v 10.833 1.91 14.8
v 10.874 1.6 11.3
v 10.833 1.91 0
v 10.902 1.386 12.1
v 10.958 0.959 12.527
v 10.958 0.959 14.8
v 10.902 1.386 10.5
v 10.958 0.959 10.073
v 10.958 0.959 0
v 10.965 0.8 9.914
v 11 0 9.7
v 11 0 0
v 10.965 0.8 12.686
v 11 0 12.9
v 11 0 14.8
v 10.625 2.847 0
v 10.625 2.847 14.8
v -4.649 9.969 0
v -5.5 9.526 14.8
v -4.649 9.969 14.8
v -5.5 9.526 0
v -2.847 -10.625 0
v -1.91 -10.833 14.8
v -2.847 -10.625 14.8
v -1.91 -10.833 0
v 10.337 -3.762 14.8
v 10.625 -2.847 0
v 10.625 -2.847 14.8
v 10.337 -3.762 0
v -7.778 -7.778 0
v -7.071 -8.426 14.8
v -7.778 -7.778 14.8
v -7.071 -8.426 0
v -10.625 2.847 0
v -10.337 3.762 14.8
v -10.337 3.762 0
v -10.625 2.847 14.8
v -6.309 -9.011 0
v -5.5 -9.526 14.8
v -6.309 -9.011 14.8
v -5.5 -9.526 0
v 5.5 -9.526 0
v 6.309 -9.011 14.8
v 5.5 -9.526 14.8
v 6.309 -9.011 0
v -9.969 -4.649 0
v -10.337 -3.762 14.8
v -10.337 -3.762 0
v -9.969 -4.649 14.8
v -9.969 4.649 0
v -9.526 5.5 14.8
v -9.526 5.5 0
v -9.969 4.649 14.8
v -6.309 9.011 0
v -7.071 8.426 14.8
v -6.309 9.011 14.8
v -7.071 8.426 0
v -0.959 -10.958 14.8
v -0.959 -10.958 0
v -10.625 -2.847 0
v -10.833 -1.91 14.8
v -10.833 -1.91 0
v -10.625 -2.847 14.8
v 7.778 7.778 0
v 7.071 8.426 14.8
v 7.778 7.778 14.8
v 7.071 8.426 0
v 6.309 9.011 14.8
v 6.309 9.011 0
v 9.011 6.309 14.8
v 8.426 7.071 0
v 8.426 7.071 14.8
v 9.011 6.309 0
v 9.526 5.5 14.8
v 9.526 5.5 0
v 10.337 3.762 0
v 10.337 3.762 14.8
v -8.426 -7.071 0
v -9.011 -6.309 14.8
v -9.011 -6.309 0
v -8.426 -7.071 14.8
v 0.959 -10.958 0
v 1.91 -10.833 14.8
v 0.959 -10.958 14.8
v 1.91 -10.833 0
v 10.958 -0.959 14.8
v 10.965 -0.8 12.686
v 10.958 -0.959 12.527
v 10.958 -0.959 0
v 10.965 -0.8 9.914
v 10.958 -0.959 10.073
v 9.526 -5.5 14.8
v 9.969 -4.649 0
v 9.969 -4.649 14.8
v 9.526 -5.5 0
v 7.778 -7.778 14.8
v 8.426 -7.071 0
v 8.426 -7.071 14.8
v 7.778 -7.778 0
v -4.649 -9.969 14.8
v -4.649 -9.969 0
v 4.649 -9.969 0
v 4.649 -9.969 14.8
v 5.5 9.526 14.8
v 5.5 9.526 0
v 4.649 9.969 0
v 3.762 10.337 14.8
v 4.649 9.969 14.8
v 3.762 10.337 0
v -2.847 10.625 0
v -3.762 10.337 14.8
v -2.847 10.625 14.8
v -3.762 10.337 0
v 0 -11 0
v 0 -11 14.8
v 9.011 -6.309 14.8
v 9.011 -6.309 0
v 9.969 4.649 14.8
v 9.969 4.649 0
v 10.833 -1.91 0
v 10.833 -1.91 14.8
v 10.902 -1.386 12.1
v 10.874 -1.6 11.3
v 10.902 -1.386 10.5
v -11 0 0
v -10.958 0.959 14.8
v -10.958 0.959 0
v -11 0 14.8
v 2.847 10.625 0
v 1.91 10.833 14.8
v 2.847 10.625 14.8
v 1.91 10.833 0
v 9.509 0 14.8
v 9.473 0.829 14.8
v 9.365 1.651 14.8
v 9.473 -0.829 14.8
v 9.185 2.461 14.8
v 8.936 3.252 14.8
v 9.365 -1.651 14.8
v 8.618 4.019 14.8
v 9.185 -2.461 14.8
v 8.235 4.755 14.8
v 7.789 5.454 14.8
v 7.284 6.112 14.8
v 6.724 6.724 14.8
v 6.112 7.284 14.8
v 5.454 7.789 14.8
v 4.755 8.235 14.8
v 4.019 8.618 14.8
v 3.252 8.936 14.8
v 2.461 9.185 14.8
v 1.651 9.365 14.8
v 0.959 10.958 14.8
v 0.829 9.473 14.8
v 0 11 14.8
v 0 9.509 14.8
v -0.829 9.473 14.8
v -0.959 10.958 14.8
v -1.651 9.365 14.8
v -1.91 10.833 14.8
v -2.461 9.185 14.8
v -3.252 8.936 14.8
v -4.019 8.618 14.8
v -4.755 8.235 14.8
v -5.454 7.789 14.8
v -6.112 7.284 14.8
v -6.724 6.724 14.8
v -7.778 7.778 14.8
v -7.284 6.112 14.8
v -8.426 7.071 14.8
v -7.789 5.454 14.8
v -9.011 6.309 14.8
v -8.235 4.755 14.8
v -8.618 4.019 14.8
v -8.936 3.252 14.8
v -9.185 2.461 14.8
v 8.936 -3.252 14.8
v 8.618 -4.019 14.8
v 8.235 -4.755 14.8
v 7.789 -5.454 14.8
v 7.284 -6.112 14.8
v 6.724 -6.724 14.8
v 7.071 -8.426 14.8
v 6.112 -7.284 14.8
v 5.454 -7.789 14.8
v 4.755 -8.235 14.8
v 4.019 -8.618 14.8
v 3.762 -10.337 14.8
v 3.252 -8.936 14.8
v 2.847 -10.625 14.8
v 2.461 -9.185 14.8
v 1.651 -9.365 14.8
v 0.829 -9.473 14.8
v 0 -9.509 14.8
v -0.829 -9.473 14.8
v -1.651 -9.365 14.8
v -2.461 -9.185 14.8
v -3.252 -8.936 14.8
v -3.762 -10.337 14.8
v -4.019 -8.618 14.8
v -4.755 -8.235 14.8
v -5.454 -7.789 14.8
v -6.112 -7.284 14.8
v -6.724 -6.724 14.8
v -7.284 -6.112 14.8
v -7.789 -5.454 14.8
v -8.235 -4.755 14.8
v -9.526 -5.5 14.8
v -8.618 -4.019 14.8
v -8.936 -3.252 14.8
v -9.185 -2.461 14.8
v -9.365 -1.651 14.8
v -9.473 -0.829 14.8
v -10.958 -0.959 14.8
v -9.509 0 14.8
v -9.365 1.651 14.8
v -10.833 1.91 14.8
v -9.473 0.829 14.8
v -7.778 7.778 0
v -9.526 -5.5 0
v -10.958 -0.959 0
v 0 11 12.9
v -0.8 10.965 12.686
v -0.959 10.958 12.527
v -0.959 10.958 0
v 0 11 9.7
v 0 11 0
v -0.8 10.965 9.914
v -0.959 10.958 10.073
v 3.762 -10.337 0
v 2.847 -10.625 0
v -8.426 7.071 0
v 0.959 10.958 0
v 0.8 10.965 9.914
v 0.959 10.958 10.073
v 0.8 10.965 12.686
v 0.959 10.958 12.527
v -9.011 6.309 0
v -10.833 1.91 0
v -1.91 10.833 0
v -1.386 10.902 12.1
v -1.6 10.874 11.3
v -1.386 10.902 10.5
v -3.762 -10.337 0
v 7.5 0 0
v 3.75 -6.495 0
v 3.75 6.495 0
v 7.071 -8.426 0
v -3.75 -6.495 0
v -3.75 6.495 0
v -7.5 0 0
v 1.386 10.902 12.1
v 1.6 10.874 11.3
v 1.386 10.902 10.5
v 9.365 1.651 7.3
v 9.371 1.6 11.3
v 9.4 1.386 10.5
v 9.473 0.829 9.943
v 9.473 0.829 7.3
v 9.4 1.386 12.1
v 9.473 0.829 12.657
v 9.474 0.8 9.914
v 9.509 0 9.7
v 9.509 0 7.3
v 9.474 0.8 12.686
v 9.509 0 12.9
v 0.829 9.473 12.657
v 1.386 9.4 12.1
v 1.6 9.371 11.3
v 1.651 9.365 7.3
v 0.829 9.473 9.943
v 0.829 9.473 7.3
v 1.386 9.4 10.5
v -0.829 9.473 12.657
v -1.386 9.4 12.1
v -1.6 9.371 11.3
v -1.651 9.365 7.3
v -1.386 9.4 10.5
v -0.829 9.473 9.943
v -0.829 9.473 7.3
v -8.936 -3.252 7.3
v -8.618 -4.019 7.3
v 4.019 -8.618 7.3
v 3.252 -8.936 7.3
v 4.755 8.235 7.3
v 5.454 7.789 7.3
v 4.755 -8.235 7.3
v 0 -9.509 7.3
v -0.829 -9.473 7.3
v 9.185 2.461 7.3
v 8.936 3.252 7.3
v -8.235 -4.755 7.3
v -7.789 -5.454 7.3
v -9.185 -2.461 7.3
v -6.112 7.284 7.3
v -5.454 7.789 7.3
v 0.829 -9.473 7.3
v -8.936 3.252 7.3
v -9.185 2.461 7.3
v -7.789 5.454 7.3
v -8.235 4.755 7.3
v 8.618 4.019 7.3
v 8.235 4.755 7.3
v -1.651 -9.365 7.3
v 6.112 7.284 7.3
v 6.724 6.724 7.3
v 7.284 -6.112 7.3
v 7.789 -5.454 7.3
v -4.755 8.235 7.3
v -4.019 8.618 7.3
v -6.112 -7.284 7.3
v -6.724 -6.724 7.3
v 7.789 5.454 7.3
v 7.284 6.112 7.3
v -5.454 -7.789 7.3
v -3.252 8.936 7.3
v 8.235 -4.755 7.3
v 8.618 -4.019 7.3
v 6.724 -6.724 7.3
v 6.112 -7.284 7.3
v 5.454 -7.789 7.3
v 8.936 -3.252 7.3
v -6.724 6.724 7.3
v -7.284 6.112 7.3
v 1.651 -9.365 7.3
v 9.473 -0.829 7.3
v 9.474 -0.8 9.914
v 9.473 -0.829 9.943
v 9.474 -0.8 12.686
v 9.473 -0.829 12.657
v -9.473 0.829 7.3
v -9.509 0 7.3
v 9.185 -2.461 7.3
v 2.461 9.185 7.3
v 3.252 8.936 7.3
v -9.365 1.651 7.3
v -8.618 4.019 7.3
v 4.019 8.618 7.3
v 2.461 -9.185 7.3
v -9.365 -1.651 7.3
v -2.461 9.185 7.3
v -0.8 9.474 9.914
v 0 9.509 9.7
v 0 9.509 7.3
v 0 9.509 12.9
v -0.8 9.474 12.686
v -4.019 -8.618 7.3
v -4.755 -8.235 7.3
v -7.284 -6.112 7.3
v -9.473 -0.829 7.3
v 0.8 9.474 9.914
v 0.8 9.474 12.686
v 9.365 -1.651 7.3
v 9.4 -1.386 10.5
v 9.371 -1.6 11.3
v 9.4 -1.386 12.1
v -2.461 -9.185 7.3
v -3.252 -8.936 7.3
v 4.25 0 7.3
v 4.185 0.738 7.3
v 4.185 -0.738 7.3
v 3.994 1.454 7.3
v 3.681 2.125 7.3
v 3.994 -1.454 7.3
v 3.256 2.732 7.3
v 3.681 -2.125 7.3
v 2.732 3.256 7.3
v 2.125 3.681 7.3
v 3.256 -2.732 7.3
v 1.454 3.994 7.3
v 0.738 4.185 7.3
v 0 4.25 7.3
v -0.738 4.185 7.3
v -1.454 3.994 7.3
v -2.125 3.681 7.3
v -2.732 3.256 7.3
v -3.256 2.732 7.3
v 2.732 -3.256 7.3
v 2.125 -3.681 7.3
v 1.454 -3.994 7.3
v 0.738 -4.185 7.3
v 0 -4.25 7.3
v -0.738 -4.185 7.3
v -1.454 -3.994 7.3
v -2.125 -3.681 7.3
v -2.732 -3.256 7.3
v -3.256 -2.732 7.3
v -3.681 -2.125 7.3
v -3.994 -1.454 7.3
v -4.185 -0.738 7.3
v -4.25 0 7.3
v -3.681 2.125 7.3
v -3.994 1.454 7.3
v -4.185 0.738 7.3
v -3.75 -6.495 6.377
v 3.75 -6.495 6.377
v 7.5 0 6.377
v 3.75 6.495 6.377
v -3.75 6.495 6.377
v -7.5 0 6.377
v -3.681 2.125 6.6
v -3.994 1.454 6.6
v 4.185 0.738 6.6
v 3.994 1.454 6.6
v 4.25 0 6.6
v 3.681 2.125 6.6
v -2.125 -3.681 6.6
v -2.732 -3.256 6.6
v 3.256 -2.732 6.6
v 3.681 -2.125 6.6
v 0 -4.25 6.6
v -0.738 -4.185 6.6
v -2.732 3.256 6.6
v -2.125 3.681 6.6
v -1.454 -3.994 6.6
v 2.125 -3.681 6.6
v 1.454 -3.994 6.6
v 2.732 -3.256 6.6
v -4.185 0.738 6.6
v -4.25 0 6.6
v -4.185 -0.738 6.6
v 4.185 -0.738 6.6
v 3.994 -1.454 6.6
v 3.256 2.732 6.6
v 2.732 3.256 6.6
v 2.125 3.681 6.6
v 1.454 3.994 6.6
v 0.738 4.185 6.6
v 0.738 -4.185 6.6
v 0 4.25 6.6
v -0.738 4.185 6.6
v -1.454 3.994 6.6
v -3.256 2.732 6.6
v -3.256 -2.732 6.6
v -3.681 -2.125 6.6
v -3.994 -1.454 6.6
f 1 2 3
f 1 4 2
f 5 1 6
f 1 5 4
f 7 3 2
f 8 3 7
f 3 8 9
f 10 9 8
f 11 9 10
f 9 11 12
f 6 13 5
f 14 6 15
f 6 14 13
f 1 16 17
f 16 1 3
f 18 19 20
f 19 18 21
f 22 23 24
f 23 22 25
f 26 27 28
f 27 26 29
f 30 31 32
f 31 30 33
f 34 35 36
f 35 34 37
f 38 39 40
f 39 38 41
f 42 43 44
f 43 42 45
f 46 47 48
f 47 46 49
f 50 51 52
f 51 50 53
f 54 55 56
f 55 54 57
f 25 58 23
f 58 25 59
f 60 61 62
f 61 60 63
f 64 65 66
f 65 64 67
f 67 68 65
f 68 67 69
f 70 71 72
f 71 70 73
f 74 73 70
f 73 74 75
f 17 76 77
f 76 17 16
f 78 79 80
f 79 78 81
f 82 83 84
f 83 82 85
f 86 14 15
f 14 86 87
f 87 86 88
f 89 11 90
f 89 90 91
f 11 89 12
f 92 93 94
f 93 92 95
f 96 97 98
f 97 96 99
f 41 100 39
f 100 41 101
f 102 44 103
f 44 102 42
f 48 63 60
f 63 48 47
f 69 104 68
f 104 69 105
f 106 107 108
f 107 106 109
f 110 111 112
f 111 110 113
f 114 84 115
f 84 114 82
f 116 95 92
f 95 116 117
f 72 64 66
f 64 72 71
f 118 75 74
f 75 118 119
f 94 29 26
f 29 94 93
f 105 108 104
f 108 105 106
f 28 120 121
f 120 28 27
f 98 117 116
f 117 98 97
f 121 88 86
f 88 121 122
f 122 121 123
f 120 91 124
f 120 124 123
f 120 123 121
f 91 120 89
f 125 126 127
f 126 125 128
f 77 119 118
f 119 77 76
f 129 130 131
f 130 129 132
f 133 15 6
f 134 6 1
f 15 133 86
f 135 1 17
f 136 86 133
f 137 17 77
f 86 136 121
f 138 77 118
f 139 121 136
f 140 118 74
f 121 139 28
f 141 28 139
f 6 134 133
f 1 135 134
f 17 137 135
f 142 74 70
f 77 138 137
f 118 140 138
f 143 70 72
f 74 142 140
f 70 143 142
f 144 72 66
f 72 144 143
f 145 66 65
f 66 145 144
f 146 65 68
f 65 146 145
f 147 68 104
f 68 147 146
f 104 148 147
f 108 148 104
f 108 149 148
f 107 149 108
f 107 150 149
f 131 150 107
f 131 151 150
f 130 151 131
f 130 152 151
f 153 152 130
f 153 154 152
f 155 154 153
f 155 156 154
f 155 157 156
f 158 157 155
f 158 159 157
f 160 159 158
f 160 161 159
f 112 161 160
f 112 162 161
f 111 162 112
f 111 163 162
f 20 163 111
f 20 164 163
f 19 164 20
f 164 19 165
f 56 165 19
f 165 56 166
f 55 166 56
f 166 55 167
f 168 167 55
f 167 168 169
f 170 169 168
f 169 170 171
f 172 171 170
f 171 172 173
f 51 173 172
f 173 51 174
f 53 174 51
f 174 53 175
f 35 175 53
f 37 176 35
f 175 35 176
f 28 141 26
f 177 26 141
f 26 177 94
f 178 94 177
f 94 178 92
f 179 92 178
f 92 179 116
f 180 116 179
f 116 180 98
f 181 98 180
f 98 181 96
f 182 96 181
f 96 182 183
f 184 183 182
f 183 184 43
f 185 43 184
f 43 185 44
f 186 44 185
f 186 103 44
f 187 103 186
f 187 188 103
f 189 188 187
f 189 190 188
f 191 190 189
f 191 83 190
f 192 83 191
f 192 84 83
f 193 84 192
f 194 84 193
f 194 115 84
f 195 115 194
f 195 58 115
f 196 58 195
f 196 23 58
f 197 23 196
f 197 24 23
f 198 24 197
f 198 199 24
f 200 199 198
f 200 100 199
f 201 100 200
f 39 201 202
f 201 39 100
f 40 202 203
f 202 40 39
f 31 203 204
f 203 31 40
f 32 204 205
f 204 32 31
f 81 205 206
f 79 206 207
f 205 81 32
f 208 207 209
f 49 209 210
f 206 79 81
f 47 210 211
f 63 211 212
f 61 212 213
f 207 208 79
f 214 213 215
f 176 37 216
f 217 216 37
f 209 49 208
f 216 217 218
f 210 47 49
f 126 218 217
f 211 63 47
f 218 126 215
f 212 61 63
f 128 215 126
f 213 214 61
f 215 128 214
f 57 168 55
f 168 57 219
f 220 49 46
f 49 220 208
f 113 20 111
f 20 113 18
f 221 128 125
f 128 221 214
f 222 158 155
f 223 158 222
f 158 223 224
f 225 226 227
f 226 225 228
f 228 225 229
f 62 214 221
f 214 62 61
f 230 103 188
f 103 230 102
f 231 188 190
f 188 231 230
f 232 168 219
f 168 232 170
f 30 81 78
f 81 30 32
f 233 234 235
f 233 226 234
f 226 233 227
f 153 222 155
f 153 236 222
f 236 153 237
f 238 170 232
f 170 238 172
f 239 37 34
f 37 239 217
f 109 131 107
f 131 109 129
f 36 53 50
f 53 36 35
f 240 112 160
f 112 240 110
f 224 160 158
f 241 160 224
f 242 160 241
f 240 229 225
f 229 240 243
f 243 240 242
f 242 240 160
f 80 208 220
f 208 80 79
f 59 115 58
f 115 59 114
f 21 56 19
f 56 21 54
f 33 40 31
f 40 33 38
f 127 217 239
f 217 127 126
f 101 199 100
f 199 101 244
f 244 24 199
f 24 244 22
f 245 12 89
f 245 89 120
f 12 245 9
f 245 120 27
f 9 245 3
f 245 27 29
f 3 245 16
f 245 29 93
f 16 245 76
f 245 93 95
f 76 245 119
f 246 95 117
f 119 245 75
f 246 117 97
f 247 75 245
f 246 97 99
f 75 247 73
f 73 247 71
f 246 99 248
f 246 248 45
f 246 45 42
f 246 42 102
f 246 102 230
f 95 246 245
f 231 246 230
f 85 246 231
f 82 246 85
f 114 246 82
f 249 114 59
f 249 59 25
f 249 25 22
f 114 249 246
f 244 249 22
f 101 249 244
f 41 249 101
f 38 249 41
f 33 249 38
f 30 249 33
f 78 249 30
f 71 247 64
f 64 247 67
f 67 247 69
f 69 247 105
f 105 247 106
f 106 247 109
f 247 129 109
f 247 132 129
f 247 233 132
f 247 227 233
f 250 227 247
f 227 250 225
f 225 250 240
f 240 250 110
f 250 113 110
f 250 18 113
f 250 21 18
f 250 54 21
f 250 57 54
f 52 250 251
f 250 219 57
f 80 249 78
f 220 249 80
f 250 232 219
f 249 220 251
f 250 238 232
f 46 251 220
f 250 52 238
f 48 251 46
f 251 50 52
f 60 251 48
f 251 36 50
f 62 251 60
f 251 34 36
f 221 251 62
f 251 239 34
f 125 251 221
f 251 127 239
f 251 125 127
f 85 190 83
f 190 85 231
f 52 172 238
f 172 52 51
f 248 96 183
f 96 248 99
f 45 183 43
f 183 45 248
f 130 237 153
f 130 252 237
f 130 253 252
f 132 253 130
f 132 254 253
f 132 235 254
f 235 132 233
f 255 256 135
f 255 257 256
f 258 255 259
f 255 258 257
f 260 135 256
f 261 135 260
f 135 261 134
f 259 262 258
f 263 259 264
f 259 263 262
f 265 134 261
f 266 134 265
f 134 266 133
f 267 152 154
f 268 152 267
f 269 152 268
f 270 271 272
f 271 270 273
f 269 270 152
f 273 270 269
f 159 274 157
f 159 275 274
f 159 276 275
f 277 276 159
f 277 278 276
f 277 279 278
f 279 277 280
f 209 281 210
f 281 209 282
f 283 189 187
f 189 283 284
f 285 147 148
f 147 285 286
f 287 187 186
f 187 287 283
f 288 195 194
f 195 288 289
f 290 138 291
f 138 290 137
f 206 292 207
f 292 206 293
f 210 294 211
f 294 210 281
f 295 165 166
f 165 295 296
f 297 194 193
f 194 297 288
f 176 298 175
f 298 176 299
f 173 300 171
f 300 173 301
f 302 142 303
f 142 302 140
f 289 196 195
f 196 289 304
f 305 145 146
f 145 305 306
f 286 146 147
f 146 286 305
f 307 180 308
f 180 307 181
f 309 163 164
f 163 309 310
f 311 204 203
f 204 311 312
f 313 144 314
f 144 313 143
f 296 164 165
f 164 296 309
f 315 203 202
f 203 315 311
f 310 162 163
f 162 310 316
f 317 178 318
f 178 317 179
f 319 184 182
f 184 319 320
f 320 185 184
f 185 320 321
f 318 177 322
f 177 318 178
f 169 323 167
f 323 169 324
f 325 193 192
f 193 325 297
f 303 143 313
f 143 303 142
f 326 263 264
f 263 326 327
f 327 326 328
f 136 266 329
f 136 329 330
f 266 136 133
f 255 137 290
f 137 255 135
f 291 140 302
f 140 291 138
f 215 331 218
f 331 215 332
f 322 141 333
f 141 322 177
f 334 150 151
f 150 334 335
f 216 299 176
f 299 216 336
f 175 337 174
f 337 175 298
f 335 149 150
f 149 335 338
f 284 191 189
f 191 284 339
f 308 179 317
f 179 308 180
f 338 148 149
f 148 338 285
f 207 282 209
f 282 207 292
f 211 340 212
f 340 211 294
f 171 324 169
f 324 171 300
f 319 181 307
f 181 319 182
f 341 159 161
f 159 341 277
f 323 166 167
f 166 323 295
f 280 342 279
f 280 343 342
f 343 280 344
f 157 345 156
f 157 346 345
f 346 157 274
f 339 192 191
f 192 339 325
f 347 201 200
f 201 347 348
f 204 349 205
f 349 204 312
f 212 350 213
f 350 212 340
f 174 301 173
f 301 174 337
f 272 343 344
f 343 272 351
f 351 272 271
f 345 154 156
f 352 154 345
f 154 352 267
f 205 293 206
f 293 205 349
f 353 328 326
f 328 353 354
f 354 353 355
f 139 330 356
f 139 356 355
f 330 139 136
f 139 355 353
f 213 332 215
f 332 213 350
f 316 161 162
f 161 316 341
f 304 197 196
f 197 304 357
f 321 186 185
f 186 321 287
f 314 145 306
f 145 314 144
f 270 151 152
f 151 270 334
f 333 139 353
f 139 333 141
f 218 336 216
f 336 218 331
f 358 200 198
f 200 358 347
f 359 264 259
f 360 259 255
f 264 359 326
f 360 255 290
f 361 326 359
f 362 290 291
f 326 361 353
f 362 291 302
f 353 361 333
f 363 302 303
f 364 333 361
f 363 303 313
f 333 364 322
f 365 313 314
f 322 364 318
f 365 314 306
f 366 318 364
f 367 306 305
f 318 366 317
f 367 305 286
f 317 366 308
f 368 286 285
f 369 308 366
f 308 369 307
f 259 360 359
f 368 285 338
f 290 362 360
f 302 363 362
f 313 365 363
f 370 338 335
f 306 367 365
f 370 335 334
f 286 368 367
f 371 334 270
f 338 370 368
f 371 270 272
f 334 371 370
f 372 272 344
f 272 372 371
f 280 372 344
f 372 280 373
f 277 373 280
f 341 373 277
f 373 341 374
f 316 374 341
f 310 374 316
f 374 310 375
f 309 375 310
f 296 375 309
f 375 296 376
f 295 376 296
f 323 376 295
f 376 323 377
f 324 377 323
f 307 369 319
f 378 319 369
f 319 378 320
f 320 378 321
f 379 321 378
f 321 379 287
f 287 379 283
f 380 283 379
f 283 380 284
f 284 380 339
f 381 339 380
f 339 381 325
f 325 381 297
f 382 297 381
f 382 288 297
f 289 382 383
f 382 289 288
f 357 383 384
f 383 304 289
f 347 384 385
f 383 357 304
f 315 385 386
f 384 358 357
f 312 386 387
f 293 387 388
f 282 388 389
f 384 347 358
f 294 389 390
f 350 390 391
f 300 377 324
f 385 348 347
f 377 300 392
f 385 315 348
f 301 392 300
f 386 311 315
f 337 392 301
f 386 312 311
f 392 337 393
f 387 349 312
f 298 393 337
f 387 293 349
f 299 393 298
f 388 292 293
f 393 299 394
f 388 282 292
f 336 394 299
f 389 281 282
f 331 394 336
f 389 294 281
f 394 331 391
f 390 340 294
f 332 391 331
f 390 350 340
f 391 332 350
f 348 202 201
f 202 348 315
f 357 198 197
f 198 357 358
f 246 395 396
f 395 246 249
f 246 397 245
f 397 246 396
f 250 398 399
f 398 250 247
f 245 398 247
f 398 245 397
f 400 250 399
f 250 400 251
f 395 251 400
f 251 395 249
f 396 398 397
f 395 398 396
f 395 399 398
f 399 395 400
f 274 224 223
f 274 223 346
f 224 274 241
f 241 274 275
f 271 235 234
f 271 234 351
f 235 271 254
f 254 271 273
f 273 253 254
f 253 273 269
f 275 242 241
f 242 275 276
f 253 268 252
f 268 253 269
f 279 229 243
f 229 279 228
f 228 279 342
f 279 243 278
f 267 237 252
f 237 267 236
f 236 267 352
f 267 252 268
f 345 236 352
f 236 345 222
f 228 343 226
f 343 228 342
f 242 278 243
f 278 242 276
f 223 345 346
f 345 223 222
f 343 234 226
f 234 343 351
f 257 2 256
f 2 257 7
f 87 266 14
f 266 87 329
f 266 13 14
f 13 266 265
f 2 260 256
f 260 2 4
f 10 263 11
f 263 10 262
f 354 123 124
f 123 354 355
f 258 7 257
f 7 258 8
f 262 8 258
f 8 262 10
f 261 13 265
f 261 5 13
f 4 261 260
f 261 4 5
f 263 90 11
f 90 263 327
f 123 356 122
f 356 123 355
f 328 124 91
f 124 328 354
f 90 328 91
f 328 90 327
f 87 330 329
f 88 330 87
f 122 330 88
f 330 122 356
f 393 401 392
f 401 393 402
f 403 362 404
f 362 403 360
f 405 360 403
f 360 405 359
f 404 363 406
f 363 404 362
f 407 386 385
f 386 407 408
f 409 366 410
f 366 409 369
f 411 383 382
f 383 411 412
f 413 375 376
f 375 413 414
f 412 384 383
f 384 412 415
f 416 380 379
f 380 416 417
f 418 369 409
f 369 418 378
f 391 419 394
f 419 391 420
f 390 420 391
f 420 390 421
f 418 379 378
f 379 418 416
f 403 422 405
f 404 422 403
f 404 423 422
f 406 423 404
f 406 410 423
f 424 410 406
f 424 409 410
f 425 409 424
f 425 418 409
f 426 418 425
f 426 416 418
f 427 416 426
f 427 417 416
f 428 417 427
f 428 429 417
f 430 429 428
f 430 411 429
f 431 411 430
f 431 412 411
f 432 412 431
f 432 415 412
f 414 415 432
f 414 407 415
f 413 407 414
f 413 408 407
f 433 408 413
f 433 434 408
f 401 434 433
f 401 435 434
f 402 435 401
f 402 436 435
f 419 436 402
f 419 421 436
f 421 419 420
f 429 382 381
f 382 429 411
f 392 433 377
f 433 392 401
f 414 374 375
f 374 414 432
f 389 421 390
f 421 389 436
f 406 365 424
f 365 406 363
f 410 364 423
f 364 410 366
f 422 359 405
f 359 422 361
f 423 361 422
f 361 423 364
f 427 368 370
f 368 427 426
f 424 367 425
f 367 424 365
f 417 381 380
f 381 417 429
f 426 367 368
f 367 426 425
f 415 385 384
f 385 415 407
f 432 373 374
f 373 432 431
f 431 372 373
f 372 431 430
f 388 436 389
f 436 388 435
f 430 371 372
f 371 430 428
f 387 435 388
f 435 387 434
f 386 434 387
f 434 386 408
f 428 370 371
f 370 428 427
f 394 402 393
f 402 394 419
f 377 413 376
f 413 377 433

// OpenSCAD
// file: Cylinder.scad
// number of faces n a circle (adapted from C code)
function get_fragments_from_r(r) =
    ($fn > 0) ? (($fn >= 3) ? $fn : 3) // at least 3 faces if fn is set
    : ceil(max(min(360 / $fa, 2 * PI * r / $fs), 5));

// Generate cylinder that fits inside a circle or radius r if outcircle is
// false and outside if outcircle is true. This prevents holes from being to
// small.
module Cylinder(r=1, r1=-1, r2=-1, h=1, outcircle=false, center=false) {
    r1_ = (r1 >= 0) ? r1 : r;
    r2_ = (r2 >= 0) ? r2 : r1_;
    n = max(get_fragments_from_r(r1_), get_fragments_from_r(r2_));
    r1__ = outcircle ? r1_ / cos(180 / n) : r1_;
    r2__ = outcircle ? r2_ / cos(180 / n) : r2_;
    cylinder(r1=r1__, r2=r2__, h=h, center=center, $fn=n);
}
// main file
use <MCAD/nuts_and_bolts.scad>
use <Cylinder.scad>

overlap = 0.123456789;

gt2Radius = 9.5;
gt2Height = 7.5;
gt2ScrewRadius = 1.6;
gt2ScrewHeight = 4;

wallHeight=1;

nutHeight = 6.3;

height = nutHeight + wallHeight + gt2Height;
radius = 11;
bore = 8.5;
layer = 0.1;

difference() {
    Cylinder(r=radius, h=height, $fn=72);
    translate([0, 0, height - gt2Height])
        Cylinder(r=gt2Radius, h=gt2Height + overlap, outcircle=true, $fn=72);
    translate([0, 0, -overlap])
        nutHole(8);
    translate([0, 0, height - gt2Height + gt2ScrewHeight])
        rotate([-90, 0, 0])
            Cylinder(r=gt2ScrewRadius, h=radius + 5, outCircle=true, $fn=12);
    translate([0, 0, height - gt2Height + gt2ScrewHeight])
        rotate([0, 90, 0])
            Cylinder(r=gt2ScrewRadius, h=radius + 5, outCircle=true, $fn=12);
    translate([0, 0, nutHeight + 3 * layer])
        Cylinder(r=0.5 * bore, h=wallHeight, outCircle=true, $fn=36);
}
